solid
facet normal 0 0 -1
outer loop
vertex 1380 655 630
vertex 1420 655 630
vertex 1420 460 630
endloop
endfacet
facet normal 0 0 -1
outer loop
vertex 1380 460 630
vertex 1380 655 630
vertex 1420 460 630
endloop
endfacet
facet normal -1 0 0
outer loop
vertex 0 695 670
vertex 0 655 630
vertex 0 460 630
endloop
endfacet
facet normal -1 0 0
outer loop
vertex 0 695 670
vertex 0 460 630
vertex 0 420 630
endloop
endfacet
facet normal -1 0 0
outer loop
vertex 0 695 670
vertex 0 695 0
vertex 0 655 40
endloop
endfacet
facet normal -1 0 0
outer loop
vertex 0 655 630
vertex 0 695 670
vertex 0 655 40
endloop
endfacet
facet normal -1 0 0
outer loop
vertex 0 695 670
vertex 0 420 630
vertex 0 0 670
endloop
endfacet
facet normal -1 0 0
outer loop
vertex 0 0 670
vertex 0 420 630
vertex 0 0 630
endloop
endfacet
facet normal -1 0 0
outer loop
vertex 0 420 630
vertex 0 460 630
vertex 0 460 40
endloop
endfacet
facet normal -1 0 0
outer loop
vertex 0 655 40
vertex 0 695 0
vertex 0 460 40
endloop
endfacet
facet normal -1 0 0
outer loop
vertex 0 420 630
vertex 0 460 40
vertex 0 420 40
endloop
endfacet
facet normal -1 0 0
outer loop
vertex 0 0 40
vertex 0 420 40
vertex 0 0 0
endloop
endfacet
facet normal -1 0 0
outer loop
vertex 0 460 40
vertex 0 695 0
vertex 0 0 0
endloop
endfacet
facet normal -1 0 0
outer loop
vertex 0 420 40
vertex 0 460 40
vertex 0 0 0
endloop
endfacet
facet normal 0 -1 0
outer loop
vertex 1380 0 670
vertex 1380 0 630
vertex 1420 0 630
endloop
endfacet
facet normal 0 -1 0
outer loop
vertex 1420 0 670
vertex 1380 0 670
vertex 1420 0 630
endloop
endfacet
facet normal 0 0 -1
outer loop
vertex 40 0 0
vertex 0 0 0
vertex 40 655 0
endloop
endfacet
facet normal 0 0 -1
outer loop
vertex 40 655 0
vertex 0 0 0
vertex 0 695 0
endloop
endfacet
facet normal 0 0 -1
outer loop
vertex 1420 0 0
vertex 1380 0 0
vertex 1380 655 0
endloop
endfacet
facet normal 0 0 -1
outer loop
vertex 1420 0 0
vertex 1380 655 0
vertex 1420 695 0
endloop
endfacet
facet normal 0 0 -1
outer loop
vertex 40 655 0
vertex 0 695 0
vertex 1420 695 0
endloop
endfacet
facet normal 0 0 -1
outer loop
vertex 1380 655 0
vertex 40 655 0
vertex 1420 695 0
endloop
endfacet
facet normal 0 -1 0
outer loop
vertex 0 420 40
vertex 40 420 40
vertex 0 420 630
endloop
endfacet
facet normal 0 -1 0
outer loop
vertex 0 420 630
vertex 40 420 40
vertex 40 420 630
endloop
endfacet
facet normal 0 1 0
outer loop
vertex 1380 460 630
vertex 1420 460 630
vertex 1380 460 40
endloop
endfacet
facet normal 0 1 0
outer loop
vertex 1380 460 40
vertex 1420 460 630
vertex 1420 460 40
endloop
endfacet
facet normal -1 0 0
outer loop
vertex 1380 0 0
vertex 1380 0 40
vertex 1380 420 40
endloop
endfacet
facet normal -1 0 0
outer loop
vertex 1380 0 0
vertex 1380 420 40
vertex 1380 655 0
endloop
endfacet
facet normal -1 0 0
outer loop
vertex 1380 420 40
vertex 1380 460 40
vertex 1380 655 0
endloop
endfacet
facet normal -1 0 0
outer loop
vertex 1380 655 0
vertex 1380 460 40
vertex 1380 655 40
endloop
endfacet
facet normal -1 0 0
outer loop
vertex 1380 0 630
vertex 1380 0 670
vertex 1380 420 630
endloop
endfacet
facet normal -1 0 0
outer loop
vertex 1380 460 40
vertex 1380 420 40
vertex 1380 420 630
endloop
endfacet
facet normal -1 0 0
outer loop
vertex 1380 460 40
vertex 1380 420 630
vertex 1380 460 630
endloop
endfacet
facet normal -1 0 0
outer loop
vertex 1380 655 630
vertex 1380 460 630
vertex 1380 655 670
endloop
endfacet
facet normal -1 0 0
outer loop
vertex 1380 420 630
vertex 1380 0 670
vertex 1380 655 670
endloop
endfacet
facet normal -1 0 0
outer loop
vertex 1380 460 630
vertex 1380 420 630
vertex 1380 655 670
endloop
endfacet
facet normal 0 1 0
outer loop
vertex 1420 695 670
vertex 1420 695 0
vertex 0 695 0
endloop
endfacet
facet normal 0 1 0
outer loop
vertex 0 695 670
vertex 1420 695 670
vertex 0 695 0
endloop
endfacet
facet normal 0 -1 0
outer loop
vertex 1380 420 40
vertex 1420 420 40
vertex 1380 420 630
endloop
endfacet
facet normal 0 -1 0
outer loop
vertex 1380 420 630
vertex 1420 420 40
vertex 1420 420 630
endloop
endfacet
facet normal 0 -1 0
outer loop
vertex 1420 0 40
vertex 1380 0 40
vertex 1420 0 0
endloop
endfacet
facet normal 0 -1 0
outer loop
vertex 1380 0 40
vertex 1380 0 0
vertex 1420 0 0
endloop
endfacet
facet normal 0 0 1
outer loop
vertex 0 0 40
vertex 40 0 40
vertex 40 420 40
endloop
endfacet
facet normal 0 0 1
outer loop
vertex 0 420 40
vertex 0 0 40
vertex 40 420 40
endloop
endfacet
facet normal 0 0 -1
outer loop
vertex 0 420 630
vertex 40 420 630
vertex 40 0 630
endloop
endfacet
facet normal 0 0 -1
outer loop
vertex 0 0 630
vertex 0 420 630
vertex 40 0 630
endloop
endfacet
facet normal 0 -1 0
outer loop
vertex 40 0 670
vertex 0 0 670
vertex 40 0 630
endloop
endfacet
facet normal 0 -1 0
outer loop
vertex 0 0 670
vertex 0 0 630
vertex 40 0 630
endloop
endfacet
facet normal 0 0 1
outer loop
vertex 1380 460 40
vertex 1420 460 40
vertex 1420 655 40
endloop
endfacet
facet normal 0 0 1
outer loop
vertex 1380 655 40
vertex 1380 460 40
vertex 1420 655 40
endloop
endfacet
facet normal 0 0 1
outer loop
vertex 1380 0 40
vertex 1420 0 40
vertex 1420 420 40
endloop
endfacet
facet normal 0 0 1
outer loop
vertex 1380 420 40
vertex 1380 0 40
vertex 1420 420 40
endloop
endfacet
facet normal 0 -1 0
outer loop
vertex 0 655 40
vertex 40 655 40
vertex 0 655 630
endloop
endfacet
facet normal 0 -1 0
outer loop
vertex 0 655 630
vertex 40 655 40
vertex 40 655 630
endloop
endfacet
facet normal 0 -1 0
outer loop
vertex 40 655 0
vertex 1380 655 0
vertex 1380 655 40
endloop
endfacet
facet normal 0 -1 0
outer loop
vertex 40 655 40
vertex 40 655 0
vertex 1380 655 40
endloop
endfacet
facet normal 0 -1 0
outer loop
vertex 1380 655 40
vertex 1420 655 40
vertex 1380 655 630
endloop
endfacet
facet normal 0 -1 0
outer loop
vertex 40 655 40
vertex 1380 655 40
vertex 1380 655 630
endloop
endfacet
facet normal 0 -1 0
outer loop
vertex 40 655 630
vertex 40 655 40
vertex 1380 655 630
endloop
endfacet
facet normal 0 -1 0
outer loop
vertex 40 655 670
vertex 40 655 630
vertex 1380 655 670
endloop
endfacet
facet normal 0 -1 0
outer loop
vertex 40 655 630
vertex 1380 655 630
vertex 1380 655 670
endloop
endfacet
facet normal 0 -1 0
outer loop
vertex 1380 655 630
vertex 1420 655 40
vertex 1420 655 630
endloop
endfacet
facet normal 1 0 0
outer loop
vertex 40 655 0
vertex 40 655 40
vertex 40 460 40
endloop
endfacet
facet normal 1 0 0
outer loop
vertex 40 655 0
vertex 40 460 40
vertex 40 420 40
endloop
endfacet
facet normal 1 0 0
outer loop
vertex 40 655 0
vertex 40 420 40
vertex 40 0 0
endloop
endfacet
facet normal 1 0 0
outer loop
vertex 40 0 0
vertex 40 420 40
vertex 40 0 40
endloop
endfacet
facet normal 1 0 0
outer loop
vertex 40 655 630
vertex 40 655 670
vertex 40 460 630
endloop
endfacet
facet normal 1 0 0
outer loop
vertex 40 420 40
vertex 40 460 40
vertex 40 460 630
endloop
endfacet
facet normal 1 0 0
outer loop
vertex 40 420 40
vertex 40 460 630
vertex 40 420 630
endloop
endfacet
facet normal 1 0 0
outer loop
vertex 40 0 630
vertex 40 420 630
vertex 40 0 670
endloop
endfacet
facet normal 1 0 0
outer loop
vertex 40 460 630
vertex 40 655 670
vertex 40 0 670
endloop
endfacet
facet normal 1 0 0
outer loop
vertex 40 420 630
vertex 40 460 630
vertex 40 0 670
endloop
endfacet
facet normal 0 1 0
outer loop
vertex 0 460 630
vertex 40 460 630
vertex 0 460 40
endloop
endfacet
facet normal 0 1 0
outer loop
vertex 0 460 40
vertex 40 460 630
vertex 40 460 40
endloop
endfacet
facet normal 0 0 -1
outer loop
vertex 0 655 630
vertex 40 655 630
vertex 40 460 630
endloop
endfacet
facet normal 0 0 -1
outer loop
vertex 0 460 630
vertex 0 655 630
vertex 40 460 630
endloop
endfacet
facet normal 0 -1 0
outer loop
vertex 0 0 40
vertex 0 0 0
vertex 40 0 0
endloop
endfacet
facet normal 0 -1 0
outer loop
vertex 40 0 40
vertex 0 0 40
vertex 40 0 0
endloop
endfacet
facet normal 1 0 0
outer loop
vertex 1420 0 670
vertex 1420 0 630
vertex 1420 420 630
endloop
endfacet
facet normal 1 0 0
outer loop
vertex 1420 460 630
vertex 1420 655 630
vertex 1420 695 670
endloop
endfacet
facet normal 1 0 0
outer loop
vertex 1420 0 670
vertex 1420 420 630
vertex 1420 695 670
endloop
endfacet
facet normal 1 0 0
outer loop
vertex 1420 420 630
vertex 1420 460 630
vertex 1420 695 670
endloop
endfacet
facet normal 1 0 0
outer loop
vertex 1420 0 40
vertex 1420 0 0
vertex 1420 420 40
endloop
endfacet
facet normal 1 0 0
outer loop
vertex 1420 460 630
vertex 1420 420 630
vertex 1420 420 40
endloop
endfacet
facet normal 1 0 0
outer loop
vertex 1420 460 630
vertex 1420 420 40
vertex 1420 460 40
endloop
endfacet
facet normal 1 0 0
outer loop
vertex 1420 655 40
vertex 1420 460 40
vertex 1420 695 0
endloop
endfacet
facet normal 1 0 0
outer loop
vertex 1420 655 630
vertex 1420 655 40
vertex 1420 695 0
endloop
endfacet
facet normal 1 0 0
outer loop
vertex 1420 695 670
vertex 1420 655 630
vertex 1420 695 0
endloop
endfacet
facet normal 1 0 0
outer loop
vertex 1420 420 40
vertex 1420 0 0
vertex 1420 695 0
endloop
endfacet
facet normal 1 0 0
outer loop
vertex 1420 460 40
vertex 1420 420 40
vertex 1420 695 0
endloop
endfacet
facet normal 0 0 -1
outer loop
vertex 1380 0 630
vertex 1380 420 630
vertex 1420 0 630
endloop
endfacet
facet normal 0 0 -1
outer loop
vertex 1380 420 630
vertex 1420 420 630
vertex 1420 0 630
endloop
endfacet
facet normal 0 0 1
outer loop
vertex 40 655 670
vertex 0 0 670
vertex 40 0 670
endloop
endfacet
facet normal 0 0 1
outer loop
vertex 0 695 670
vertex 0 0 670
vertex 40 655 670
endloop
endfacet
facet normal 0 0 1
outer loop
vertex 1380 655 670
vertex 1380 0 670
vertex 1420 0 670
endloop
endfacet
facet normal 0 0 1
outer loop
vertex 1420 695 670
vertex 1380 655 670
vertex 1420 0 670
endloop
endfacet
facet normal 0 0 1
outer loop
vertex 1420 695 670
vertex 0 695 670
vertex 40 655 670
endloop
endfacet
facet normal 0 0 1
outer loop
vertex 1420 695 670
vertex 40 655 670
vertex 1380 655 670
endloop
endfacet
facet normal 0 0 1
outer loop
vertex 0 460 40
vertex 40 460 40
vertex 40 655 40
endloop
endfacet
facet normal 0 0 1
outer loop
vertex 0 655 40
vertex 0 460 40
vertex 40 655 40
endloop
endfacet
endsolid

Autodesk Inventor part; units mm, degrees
ref_plane "YZ Plane" through (0, 0, 0) normal (1, 0, 0) x (0, 1, 0)
ref_plane "XZ Plane" through (0, 0, 0) normal (0, 1, 0) x (-1, 0, 0)
ref_plane "XY Plane" through (0, 0, 0) normal (0, 0, 1) x (1, 0, 0)
sketch "Sketch1" plane through (0, 0, 0) normal (0, 0, 1) x (1, 0, 0)
  line L0 (0, 0) -> (1420, 0)
  line L1 (1420, 0) -> (1420, 695)
  line L2 (1420, 695) -> (0, 695)
  line L3 (0, 695) -> (0, 0)
  dimension "d0" = 695
  dimension "d1" = 1420
extrude "Extrusion1" add sketch "Sketch1" along normal blind 670
sketch "Sketch2" plane through (1420, 0, 0) normal (1, 0, 0) x (0, 0, -1)
  line L0 (-630, 0) -> (-40, 0)
  line L1 (-40, 0) -> (-40, 420)
  line L2 (-40, 420) -> (-630, 420)
  line L3 (-630, 420) -> (-630, 0)
  line L4 (-670, 695) -> (-670, 0) projected
  line L5 (0, 0) -> (0, 695) projected
  line L6 (0, 0) -> (-670, 0) projected
  dimension "d4" = 420
  dimension "d5" = 40
  dimension "d6" = 40
extrude "Extrusion2" cut sketch "Sketch2" against normal blind 2000
sketch "Sketch3" plane through (1420, 0, 0) normal (1, 0, 0) x (0, 0, -1)
  line L0 (-630, 460) -> (-40, 460)
  line L1 (-40, 460) -> (-40, 655)
  line L2 (-40, 655) -> (-630, 655)
  line L3 (-630, 655) -> (-630, 460)
  line L4 (0, 695) -> (-670, 695) projected
  line L5 (-670, 695) -> (-670, 0) projected
  line L6 (-630, 420) -> (-40, 420) projected
  line L7 (0, 0) -> (0, 695) projected
  dimension "d9" = 40
  dimension "d10" = 40
  dimension "d11" = 40
  dimension "d12" = 40
extrude "Extrusion3" cut sketch "Sketch3" against normal blind 2000
sketch "Sketch4" plane through (0, 0, 670) normal (0, 0, 1) x (1, 0, 0)
  line L0 (40, 0) -> (1380, 0)
  line L1 (1380, 0) -> (1380, 655)
  line L2 (1380, 655) -> (40, 655)
  line L3 (40, 655) -> (40, 0)
  line L4 (0, 0) -> (1420, 0) projected
  line L5 (0, 420) -> (0, 0) projected
  line L6 (1420, 0) -> (1420, 695) projected
  line L7 (1420, 695) -> (0, 695) projected
  dimension "d15" = 40
  dimension "d16" = 40
  dimension "d17" = 40
extrude "Extrusion4" cut sketch "Sketch4" against normal blind 1000
properties part number "bottomtable"
